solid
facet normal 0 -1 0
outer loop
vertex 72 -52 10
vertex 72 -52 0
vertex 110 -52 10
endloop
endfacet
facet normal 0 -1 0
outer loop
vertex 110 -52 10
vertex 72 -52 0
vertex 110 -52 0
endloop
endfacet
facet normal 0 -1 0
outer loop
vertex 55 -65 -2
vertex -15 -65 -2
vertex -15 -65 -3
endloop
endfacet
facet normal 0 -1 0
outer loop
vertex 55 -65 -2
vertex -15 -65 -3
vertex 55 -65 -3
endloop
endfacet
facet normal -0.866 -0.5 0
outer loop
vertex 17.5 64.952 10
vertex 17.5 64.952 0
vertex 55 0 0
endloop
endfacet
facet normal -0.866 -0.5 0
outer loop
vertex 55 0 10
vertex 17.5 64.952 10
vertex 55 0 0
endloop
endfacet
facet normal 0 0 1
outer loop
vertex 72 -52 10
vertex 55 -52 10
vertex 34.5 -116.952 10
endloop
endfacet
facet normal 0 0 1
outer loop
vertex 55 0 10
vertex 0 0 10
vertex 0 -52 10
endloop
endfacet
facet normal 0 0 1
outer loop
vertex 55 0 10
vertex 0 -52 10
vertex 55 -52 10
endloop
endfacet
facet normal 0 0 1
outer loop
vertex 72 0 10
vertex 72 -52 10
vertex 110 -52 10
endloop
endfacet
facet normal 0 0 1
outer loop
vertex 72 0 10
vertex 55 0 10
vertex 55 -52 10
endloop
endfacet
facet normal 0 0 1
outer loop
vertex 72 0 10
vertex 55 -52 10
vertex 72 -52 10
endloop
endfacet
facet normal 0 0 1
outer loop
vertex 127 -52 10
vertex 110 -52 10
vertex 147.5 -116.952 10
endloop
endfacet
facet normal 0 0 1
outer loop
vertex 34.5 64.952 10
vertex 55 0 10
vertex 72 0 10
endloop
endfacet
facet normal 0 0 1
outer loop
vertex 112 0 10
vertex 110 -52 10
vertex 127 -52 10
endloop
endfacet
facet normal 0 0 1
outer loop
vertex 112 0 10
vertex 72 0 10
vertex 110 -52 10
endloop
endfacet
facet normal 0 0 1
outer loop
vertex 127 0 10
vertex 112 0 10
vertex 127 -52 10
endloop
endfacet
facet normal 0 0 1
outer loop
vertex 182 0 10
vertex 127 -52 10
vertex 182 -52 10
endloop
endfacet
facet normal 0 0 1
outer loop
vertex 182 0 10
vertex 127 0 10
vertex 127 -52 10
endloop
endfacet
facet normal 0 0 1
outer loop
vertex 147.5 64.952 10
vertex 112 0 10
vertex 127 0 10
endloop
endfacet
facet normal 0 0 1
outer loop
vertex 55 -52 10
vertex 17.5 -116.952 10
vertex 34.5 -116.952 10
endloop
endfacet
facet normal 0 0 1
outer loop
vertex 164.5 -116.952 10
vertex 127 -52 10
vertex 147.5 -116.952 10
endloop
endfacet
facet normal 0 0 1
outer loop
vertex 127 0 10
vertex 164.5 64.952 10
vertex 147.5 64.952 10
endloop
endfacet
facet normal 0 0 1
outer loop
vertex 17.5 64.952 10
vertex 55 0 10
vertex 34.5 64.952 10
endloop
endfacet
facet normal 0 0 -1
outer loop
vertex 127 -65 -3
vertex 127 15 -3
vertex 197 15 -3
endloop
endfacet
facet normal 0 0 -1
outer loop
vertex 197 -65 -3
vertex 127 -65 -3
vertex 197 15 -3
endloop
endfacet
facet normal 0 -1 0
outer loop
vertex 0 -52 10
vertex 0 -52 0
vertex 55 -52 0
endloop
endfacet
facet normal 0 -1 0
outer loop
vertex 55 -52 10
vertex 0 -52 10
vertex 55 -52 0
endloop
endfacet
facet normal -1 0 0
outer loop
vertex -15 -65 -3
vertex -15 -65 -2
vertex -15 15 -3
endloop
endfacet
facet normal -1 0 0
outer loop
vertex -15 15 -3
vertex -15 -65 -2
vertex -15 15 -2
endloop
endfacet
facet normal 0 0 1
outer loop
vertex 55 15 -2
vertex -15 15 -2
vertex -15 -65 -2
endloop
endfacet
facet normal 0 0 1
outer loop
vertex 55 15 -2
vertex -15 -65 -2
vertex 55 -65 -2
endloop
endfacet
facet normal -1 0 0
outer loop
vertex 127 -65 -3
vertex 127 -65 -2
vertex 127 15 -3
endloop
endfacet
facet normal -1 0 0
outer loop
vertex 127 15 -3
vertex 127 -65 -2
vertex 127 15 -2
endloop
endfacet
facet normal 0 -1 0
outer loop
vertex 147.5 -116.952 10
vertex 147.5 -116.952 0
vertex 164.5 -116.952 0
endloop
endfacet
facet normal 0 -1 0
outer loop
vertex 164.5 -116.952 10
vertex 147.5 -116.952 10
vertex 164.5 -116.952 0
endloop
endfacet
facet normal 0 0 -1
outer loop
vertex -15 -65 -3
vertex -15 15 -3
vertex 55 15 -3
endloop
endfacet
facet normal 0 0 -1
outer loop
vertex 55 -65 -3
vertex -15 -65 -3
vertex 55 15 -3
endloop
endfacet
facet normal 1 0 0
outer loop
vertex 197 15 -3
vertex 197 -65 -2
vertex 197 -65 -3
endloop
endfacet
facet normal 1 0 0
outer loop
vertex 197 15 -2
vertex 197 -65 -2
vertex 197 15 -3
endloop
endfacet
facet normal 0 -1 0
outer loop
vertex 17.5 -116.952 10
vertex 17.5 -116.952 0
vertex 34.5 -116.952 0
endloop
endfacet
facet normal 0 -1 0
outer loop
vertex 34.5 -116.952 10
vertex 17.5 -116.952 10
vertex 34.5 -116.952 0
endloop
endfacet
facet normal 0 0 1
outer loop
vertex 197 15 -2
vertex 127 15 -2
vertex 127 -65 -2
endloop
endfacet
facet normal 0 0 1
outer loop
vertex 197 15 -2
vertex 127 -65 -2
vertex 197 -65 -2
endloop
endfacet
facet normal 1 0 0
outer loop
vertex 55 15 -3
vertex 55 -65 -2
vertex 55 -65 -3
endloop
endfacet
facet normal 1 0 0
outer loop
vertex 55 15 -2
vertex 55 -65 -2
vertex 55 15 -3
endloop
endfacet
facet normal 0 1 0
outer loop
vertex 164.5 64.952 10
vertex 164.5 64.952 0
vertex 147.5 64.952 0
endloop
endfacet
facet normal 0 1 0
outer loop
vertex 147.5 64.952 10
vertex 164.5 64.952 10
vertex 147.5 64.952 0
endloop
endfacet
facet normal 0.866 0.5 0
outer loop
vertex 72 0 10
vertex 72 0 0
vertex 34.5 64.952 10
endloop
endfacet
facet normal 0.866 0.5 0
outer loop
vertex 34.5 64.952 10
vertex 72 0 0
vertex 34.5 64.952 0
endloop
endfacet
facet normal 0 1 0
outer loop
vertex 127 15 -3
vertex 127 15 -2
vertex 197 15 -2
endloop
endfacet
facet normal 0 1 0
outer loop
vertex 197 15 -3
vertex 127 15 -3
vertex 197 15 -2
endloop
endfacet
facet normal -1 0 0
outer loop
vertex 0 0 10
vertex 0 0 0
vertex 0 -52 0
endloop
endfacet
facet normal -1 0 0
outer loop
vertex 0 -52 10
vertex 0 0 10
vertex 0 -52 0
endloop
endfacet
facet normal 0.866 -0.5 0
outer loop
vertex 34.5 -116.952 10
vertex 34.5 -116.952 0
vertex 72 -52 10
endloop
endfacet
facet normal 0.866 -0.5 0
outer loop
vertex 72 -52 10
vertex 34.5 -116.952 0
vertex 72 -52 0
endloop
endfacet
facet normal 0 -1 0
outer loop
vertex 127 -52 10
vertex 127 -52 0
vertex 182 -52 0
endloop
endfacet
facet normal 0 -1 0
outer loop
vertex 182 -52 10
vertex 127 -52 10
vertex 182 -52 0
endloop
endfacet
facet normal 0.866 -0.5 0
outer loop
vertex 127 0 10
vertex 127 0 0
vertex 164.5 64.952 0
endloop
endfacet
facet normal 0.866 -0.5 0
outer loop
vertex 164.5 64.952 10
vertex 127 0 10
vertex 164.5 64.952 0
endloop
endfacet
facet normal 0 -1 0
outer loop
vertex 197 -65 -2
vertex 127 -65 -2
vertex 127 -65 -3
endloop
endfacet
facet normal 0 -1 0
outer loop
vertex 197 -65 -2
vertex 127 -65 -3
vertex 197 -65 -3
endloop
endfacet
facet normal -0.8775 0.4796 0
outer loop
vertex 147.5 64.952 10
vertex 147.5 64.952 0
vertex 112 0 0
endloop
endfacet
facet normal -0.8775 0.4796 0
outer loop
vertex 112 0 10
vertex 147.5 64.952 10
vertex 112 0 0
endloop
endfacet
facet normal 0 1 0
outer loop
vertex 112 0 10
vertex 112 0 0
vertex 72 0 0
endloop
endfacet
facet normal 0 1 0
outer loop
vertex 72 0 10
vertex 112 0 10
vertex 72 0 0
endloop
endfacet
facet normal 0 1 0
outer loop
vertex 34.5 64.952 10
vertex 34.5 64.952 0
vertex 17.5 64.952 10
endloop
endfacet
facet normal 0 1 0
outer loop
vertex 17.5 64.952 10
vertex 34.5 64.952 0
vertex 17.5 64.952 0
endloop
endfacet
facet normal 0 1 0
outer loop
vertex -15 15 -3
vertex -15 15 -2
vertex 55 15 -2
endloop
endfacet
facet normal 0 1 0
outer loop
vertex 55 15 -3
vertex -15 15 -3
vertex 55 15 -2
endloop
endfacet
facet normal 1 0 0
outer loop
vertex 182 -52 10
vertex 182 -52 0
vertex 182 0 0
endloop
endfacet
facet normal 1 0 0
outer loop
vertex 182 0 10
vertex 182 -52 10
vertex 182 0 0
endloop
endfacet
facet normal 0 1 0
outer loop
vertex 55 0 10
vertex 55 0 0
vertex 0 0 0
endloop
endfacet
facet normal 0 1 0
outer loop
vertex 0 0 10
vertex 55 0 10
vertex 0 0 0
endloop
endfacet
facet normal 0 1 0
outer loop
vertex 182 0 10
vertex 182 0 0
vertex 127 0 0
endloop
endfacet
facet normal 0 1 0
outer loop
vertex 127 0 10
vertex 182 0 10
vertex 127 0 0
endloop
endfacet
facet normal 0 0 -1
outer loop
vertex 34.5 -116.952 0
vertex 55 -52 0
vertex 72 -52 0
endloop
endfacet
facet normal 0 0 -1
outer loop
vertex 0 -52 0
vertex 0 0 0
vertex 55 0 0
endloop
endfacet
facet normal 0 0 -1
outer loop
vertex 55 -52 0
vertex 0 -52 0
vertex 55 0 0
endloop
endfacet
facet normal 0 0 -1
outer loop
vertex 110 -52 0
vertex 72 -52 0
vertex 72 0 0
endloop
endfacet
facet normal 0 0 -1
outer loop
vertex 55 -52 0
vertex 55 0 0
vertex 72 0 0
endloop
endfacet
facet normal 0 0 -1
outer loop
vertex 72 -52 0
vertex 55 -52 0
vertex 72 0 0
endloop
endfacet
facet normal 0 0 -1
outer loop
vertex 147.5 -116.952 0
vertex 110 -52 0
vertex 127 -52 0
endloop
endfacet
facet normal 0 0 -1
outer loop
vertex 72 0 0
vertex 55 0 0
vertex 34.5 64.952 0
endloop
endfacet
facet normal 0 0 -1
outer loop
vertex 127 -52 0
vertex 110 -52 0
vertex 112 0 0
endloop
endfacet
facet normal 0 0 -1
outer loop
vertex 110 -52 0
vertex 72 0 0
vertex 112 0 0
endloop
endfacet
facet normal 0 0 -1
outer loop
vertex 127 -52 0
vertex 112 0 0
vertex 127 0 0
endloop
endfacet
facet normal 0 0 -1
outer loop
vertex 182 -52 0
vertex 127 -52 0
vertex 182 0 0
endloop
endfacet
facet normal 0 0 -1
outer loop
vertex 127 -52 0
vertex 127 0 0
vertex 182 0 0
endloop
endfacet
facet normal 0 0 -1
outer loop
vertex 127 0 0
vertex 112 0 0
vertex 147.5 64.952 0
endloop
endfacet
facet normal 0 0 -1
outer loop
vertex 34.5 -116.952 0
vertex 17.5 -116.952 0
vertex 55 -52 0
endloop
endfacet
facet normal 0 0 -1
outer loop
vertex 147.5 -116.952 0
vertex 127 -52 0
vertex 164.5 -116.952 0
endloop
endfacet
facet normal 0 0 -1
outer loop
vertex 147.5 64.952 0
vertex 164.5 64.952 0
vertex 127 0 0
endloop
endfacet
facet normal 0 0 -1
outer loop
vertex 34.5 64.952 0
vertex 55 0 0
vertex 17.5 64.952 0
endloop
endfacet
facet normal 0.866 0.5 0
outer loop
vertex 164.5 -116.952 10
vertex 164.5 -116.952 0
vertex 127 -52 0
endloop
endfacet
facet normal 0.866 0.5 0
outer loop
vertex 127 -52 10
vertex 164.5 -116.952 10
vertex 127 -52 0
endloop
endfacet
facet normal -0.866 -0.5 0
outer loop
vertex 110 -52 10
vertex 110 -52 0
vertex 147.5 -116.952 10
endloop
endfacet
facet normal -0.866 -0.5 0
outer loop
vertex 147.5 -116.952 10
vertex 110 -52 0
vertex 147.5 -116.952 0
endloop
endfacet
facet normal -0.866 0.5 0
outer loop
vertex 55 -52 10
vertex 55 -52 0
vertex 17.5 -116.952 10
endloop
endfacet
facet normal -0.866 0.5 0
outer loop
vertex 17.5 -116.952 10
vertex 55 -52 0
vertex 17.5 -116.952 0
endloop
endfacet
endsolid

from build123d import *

# Parameters (mm, degrees)
F1_DEPTH = 10
F3_START = -2
F2_W     = 70
F2_H     = 80
F3_DEPTH = 1


with BuildPart() as f1:
    # F0 (on Top) → F1 (new body)
    with BuildSketch(Plane.XY):
        Polygon((55, 0), (0, 0), (0, -52), (55, -52), (72, -52), (110, -52), (127, -52), (182, -52), (182, 0), (127, 0), (112, 0), (72, 0), align=None)
        Polygon((17.5, 64.9519052838), (55, 0), (72, 0), (34.5, 64.9519052838), align=None)
        Polygon((72, -52), (55, -52), (17.5, -116.9519052838), (34.5, -116.9519052838), align=None)
        Polygon((147.5, 64.9519052838), (112, 0), (127, 0), (164.5, 64.9519052838), align=None)
        Polygon((127, -52), (110, -52), (147.5, -116.9519052838), (164.5, -116.9519052838), align=None)
    extrude(amount=F1_DEPTH)


with BuildPart() as f3:
    # F2 (on Top) → F3 (new body)
    with BuildSketch(Plane.XY.offset(F3_START)):
        with Locations((20, -25)):
            Rectangle(F2_W, F2_H)
    extrude(amount=-F3_DEPTH)


with BuildPart() as f3b:
    # F2 (on Top) → F3, piece 2 (new body)
    with BuildSketch(Plane.XY.offset(F3_START)):
        with Locations((162, -25)):
            Rectangle(F2_W, F2_H)
    extrude(amount=-F3_DEPTH)


solid = Compound([f1.part, f3.part, f3b.part])
